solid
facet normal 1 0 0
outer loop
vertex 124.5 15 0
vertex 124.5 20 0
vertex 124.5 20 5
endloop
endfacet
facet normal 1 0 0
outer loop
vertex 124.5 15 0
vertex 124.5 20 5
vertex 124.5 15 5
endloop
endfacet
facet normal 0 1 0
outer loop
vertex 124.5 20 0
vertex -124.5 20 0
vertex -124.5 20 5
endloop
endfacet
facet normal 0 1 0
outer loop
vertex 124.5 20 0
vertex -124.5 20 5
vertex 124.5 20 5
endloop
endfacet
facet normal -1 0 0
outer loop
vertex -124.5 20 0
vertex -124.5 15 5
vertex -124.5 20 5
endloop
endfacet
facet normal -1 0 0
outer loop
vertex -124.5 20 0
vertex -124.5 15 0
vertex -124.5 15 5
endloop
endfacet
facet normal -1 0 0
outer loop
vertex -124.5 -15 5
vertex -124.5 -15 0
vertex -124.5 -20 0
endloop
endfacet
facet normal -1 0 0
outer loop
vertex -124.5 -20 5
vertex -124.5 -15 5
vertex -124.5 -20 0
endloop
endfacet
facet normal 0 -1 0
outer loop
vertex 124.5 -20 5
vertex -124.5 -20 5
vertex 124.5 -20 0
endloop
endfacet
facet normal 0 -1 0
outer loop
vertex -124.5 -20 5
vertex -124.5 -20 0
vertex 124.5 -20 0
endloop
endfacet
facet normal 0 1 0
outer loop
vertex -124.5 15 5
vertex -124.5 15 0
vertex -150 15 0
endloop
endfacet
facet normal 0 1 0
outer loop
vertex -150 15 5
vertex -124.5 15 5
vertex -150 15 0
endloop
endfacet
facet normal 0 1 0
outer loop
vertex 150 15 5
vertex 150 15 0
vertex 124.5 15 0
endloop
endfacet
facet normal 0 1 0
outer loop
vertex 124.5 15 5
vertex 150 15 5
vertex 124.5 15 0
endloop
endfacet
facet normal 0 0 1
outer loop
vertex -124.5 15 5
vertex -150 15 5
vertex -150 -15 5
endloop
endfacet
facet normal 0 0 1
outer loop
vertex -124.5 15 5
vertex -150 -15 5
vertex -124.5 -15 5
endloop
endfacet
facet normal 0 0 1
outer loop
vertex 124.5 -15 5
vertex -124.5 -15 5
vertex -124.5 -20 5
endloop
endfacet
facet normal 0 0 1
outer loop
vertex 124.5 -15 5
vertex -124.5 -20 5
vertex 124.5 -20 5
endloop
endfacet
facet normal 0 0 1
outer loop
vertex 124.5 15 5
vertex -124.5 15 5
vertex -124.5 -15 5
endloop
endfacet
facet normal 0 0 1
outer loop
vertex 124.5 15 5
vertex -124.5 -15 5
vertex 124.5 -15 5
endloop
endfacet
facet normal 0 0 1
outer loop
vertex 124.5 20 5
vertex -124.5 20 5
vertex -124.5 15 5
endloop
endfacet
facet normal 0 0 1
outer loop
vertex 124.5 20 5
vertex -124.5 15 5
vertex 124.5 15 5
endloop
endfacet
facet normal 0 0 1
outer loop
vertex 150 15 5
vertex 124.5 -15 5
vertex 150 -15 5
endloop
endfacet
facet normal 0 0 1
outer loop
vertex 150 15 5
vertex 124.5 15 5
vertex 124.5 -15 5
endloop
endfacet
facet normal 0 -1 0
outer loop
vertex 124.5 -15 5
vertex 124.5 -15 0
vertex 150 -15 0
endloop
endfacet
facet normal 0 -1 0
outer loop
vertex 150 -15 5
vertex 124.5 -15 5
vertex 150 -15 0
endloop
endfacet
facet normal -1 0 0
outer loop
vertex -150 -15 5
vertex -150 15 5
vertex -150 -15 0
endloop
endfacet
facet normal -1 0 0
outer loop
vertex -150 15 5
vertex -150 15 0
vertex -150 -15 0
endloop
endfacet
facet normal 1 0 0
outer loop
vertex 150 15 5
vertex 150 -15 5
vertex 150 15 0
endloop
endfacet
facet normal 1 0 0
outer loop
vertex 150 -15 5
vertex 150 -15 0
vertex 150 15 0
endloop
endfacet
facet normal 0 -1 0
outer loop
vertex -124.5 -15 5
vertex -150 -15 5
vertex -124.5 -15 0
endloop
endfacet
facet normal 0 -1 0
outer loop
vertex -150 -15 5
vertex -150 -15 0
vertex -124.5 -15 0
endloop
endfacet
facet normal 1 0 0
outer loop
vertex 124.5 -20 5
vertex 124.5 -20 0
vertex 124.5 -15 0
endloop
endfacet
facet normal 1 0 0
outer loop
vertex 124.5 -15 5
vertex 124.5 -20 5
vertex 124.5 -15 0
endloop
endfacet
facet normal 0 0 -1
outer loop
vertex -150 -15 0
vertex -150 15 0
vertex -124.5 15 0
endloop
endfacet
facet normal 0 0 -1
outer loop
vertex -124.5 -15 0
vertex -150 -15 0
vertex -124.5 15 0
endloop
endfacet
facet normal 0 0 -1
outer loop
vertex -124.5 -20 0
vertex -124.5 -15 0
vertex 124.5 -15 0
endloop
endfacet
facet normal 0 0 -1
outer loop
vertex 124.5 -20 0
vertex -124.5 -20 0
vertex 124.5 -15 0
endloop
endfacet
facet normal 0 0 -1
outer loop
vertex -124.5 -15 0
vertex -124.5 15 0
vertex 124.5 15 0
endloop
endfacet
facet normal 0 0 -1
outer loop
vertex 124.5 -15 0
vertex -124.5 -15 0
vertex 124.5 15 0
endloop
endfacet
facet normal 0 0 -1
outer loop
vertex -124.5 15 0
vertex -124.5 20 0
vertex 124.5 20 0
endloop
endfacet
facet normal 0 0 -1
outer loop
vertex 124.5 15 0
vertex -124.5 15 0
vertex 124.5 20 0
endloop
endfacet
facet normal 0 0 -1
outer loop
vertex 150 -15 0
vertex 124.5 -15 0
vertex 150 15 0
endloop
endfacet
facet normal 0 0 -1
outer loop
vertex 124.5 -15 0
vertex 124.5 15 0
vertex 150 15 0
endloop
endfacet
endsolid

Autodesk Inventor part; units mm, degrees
ref_plane "YZ Plane" through (0, 0, 0) normal (1, 0, 0) x (0, 1, 0)
ref_plane "XZ Plane" through (0, 0, 0) normal (0, 1, 0) x (-1, 0, 0)
ref_plane "XY Plane" through (0, 0, 0) normal (0, 0, 1) x (1, 0, 0)
sketch "Sketch1" plane through (0, 0, 0) normal (0, 0, 1) x (1, 0, 0)
  line L0 (-150, -15) -> (150, -15)
  line L1 (150, -15) -> (150, 15)
  line L2 (150, 15) -> (-150, 15)
  line L3 (-150, 15) -> (-150, -15)
  line L4 (-150, -15) -> (150, 15) construction
  line L5 (150, -15) -> (-150, 15) construction
  line L6 (-124.5, 20) -> (124.5, 20)
  line L7 (124.5, 20) -> (124.5, 15)
  line L8 (124.5, 15) -> (-124.5, 15)
  line L9 (-124.5, 15) -> (-124.5, 20)
  line L10 (-124.5, 20) -> (124.5, 15) construction
  line L11 (124.5, 20) -> (-124.5, 15) construction
  line L12 (-150, 0) -> (150, 0)
  line L13 (-124.5, -20) -> (124.5, -20)
  line L14 (124.5, -20) -> (124.5, -15)
  line L15 (124.5, -15) -> (-124.5, -15)
  line L16 (-124.5, -15) -> (-124.5, -20)
  line L17 (-124.5, -20) -> (124.5, -15) construction
  line L18 (124.5, -20) -> (-124.5, -15) construction
  point P0 (0, 0)
  point P1 (0, 0)
  point P2 (0, 17.5)
  point P3 (0, 15)
  point P4 (-77.3047, 14.0744)
  point P5 (81.6953, 14.0744)
  point P6 (0, -15)
  point P7 (0, -17.5)
  dimension "d0" = 5
  dimension "d1" = 30
  dimension "d2" = 300
  dimension "d3" = 249
extrude "Plate1" add sketch "Sketch1" along normal blind 5
equation "\"d4\" = Thickness"
equation "\"BendRadius\" = Thickness"
equation "\"BendReliefWidth\" = Thickness"
equation "\"BendReliefDepth\" = 0.5 * Thickness"
equation "\"TransitionRadius\" = BendRadius"
equation "\"JacobiRadiusSize\" = BendRadius"
equation "\"GapSize\" = Thickness"
equation "\"Thickness\" = 5"
properties part number "Base Leg V2"
